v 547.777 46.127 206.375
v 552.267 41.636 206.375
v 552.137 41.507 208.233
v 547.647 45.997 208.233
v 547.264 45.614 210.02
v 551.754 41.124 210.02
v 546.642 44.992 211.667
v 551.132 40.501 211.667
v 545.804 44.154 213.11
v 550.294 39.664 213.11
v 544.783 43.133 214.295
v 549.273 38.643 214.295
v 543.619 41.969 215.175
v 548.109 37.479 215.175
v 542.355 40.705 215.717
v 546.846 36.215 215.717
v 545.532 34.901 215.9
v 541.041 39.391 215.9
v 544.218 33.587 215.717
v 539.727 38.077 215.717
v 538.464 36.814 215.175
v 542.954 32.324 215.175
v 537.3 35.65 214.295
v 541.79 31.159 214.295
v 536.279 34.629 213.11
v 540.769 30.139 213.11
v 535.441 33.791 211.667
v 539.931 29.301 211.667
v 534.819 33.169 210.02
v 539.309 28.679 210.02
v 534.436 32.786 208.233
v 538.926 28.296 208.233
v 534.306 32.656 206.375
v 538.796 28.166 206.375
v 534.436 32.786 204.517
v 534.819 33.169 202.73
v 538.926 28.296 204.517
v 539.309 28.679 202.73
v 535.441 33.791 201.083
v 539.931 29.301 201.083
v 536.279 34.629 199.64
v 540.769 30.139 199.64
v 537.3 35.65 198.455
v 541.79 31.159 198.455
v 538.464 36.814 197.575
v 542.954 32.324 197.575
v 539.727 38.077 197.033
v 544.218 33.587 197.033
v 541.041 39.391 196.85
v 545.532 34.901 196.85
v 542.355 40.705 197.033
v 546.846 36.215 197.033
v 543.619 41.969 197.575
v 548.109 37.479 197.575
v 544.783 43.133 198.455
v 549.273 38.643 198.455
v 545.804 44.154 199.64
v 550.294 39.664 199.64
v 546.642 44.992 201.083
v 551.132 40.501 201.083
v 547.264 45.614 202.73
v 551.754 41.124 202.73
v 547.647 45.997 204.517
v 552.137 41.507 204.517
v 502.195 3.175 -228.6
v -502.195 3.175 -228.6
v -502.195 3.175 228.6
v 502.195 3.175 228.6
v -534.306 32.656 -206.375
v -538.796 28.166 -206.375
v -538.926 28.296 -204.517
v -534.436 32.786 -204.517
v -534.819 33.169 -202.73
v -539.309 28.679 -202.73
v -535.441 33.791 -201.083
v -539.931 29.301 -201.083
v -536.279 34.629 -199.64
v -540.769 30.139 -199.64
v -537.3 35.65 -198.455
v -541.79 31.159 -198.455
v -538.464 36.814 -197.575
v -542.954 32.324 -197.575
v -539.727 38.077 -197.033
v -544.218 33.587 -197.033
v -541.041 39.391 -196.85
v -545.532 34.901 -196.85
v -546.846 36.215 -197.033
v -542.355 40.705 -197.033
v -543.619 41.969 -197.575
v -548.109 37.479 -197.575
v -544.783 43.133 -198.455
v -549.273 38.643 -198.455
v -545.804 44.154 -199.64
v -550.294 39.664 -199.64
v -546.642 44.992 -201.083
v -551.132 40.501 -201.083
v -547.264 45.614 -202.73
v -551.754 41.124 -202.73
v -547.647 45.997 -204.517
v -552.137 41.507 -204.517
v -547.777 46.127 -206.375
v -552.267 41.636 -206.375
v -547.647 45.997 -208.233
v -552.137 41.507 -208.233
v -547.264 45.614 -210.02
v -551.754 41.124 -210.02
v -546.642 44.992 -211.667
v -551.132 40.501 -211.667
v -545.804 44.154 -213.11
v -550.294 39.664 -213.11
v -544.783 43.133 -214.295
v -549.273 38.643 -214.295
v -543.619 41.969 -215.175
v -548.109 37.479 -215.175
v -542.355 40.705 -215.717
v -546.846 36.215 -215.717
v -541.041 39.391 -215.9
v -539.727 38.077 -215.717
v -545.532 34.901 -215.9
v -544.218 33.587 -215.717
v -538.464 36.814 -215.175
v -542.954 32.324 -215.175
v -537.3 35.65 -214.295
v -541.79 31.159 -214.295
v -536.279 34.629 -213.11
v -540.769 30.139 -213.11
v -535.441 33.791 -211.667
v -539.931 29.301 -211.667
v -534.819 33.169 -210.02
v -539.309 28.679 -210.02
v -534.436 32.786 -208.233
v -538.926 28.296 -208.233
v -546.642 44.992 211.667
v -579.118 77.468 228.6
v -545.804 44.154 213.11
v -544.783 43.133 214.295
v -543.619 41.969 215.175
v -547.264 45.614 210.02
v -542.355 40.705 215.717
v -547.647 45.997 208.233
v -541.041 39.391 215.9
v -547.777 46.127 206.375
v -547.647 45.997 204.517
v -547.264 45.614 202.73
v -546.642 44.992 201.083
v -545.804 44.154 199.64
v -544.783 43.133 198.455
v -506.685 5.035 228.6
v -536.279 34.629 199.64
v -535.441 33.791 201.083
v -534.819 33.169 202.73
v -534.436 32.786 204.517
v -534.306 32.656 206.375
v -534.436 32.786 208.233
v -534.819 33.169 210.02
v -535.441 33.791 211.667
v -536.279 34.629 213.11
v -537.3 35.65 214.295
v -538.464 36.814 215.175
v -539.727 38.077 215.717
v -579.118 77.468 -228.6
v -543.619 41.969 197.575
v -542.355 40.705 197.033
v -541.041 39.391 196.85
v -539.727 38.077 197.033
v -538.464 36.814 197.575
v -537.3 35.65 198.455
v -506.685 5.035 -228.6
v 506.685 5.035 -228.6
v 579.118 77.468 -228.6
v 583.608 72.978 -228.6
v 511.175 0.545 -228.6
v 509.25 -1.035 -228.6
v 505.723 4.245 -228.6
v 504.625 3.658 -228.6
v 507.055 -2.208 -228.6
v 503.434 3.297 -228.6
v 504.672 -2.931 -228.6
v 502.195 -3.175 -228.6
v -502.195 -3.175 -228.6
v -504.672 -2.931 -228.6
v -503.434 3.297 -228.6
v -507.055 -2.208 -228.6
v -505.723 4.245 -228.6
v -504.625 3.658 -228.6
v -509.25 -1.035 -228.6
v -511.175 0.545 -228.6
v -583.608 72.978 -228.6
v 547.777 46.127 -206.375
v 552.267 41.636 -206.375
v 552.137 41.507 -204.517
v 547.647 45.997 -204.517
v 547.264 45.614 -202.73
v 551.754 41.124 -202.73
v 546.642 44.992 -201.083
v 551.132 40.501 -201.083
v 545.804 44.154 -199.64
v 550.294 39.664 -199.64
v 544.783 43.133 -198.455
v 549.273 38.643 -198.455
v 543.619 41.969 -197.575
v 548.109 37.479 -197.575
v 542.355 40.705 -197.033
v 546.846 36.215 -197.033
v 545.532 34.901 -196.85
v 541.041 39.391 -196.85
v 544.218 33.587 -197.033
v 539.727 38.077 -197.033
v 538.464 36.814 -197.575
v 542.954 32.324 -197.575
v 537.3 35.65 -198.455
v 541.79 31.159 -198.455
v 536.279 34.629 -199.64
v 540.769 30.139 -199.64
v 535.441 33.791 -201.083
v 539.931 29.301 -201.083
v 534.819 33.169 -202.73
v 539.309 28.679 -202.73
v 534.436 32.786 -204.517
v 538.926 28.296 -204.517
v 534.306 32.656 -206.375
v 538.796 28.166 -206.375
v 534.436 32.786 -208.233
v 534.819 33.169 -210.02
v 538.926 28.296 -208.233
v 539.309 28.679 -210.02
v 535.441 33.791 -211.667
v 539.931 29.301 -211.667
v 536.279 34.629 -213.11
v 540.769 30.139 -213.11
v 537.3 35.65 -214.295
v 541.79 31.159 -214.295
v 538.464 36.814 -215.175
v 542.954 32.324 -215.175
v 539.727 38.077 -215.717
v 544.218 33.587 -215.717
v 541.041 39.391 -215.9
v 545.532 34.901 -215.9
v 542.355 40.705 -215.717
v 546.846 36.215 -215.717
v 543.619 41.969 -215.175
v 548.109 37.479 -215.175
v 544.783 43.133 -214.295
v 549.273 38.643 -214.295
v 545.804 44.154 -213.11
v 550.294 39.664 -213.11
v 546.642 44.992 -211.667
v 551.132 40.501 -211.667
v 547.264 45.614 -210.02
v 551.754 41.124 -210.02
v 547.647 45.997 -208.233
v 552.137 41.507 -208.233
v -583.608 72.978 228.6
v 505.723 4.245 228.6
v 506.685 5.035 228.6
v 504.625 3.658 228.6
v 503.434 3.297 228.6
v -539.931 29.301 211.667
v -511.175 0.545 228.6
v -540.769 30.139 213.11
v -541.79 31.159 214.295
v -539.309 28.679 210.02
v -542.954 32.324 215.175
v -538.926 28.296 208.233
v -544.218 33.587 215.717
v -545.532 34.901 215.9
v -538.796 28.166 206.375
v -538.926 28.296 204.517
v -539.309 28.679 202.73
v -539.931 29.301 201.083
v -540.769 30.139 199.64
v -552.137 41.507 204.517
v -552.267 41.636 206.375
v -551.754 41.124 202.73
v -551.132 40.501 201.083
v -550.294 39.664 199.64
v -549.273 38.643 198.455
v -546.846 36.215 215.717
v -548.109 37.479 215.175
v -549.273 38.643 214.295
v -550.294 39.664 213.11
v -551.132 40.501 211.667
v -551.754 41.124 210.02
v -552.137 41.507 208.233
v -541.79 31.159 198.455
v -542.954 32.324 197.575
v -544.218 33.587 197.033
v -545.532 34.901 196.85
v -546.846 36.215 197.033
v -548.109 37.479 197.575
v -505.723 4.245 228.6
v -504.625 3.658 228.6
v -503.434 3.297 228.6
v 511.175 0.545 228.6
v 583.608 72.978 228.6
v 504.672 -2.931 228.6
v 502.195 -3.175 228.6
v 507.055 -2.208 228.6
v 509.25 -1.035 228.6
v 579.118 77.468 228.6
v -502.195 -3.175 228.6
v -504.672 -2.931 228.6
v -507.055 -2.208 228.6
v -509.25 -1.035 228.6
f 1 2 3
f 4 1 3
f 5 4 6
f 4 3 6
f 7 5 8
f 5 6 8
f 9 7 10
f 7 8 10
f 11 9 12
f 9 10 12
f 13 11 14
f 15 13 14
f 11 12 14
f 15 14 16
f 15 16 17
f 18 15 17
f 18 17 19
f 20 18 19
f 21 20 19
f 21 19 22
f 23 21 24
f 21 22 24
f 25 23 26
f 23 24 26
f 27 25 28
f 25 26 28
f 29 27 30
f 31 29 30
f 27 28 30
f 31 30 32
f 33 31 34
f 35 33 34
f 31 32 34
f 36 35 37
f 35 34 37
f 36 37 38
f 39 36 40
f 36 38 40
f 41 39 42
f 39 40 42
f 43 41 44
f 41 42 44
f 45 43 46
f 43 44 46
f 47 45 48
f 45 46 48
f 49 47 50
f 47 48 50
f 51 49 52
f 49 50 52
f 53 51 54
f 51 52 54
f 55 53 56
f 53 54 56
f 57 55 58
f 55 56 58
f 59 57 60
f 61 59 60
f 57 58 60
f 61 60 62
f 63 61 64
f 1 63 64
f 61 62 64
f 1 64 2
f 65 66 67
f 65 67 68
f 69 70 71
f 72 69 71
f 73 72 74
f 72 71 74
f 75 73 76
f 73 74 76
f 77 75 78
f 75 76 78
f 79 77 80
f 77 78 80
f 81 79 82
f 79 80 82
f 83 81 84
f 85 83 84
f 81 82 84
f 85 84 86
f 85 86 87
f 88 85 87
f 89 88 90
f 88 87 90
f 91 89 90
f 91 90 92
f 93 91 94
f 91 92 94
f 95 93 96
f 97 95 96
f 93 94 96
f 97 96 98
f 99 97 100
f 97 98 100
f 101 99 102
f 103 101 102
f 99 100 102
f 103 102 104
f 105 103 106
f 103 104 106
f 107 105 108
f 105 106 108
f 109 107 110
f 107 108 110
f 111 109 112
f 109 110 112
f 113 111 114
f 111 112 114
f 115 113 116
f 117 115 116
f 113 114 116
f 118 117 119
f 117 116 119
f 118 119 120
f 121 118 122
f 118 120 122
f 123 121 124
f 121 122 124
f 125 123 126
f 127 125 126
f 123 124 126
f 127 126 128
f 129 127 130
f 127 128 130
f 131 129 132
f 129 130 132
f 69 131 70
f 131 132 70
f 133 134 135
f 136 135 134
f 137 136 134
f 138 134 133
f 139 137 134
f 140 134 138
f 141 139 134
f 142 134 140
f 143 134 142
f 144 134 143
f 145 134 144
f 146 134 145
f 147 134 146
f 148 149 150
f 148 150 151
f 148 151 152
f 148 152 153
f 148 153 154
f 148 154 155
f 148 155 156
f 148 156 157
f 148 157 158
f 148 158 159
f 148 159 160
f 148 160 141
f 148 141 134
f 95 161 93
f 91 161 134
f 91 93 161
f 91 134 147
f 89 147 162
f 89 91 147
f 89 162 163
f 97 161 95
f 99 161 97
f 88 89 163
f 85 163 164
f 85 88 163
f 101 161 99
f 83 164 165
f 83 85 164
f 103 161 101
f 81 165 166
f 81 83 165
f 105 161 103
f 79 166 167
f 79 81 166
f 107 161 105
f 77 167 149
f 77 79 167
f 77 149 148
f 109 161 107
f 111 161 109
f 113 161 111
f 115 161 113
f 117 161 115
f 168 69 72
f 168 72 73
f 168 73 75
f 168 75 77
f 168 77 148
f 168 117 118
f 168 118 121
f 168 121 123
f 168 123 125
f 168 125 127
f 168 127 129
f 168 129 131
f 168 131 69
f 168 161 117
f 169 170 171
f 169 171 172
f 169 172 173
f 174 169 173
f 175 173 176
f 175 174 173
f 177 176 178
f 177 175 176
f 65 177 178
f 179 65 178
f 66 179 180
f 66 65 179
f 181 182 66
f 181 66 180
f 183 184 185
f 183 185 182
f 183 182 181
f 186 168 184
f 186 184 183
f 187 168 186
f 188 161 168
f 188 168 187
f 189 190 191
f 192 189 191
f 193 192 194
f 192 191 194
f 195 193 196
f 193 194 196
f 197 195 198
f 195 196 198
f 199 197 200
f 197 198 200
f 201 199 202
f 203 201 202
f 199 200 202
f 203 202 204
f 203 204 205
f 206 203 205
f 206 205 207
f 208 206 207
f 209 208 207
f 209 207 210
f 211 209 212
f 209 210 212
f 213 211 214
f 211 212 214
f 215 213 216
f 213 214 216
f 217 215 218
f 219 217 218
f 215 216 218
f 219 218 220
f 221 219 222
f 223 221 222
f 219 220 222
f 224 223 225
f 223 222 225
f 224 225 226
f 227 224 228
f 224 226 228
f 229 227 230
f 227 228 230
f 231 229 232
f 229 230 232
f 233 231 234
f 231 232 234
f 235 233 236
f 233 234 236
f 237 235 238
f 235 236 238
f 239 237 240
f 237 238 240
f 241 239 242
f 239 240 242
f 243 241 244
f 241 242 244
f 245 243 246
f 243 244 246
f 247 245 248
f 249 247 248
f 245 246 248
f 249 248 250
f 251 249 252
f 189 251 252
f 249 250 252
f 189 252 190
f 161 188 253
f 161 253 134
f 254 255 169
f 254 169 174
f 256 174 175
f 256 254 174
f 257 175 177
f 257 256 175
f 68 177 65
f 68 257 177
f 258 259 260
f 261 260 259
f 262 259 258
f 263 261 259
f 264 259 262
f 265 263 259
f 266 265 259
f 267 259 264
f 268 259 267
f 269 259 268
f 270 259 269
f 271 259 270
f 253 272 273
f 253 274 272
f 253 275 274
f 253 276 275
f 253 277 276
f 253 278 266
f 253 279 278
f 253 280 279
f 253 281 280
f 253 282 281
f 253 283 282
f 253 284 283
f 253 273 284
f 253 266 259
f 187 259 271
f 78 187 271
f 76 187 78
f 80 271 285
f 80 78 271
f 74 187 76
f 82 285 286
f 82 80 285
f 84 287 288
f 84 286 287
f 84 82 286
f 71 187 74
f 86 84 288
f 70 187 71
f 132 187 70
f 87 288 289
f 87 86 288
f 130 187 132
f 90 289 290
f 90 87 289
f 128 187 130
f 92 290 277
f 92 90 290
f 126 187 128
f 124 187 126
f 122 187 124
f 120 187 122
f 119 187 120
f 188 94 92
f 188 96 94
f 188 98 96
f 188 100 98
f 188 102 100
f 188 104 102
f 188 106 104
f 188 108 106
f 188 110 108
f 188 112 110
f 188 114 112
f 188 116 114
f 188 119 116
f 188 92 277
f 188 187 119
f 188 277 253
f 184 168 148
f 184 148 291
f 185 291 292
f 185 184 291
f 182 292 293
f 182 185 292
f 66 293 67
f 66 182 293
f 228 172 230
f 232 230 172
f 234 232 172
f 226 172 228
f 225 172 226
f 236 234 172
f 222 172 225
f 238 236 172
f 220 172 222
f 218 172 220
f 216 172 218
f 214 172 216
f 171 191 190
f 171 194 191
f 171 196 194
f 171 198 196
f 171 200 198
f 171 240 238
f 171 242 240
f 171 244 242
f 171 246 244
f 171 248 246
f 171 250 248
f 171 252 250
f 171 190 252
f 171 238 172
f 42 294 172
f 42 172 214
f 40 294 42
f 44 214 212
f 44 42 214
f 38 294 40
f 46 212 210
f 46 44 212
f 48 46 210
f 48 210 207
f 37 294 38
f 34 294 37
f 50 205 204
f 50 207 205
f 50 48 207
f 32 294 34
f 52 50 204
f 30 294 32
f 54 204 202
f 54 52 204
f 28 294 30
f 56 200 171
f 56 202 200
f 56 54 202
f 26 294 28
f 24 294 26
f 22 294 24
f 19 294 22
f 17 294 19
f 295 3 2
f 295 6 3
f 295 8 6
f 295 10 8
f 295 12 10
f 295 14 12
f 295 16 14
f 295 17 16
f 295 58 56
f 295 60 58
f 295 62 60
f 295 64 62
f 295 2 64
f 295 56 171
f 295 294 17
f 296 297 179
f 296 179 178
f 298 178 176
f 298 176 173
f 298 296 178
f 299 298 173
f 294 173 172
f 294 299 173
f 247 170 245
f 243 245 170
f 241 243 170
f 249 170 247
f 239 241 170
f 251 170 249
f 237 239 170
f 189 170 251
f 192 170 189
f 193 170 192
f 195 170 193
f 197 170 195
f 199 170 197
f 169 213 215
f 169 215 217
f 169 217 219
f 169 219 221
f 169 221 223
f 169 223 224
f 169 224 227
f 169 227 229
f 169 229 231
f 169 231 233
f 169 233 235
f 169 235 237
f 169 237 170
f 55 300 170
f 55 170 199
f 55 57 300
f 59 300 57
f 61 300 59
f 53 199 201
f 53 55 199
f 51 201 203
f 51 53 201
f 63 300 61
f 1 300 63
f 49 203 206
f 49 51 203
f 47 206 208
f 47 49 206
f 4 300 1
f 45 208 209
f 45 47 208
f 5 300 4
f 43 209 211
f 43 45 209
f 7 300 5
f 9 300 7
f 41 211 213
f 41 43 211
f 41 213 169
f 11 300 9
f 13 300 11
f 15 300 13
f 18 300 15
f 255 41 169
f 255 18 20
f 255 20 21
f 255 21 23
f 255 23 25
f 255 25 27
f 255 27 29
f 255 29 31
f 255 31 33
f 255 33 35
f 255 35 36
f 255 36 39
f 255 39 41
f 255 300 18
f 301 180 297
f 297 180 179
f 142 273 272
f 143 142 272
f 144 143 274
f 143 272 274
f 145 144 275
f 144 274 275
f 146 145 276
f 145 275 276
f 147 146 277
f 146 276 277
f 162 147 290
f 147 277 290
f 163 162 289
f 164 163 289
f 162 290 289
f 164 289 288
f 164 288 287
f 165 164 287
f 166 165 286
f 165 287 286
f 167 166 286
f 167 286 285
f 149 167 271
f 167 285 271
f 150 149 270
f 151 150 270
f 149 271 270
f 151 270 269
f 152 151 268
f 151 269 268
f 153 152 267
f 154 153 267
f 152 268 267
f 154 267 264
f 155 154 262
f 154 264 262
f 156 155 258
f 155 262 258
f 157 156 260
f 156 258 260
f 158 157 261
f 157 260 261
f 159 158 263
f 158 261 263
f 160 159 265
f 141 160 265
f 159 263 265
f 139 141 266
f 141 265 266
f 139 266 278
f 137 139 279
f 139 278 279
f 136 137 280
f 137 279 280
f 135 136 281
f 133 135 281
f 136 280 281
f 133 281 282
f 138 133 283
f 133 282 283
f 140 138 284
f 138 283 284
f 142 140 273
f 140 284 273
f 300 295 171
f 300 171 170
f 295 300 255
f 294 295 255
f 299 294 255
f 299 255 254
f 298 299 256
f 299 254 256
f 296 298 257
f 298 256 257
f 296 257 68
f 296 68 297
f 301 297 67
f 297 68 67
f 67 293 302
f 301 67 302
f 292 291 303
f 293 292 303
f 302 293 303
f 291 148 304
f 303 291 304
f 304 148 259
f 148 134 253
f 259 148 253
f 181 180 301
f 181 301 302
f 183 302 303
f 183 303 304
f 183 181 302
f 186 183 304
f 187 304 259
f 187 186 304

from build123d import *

# Parameters (mm, degrees)
BASE_FLANGE1_START             = -3.175
BASE_FLANGE1_OUTLINE_W         = 1009.65
BASE_FLANGE1_OUTLINE_H         = 457.2
BASE_FLANGE1_DEPTH             = 6.35
EDGE_FLANGE1_STRIP_CUT_DEPTH   = 457.2
EDGE_FLANGE1_STRIP_CUT_2_DEPTH = 457.2
EDGE_FLANGE1_DEPTH             = 457.2
EDGE_FLANGE1_BEND_DEPTH        = 457.2
SKETCH12_R                     = 9.525
CUT_EXTRUDE1_DEPTH             = 6.35
SKETCH13_R                     = 9.525
CUT_EXTRUDE2_DEPTH             = 6.35


# Read off the part's stored shape, not the designer's step: Base-Flange1
# Sheet-metal steps are written as plain solids
with BuildPart() as part:
    # Base-Flange1 outline → Base-Flange1 (new body)
    with BuildSketch(Plane(origin=(0, 0, 0), x_dir=(1, 0, 0), z_dir=(0, 1, 0)).offset(BASE_FLANGE1_START)):
        Rectangle(BASE_FLANGE1_OUTLINE_W, BASE_FLANGE1_OUTLINE_H)
    extrude(amount=BASE_FLANGE1_DEPTH)

    # Edge-Flange1 strip (across the edge) → Edge-Flange1 strip cut (cut)
    with BuildSketch(Plane(origin=(504.825, 3.175, 228.6), x_dir=(-0.7071067811865438, 0.7071067811865512, 0), z_dir=(0, 0, -1))):
        Polygon((-29.571024484, 20.590768363), (-2.630256121, -6.35), (1.859871939, -1.859871939), (-25.080896424, 25.080896424), align=None)
    extrude(amount=EDGE_FLANGE1_STRIP_CUT_DEPTH, mode=Mode.SUBTRACT)

    # Edge-Flange1 strip 2 (across the edge) → Edge-Flange1 strip cut 2 (cut)
    with BuildSketch(Plane(origin=(-504.825, 3.175, -228.6), x_dir=(0.7071067811865438, 0.7071067811865512, 0), z_dir=(0, 0, 1))):
        Polygon((-29.571024484, 20.590768363), (-2.630256121, -6.35), (1.859871939, -1.859871939), (-25.080896424, 25.080896424), align=None)
    extrude(amount=EDGE_FLANGE1_STRIP_CUT_2_DEPTH, mode=Mode.SUBTRACT)

    # Edge-Flange1 section (across the edge) → Edge-Flange1 (add)
    with BuildSketch(Plane(origin=(504.825, 3.175, 228.6), x_dir=(-0.7071067811865438, 0.7071067811865512, 0), z_dir=(0, 0, -1))):
        with BuildLine():
            Line((-6.35, 2.630256121), (-6.35, 105.065743879))
            Line((-6.35, 105.065743879), (0, 105.065743879))
            Line((0, 105.065743879), (0, 2.630256121))
            ThreePointArc((0, 2.630256121), (0.483364969, 0.200216326), (1.859871939, -1.859871939))
            Line((1.859871939, -1.859871939), (-2.630256121, -6.35))
            ThreePointArc((-2.630256121, -6.35), (-5.383270063, -2.22982347), (-6.35, 2.630256121))
        make_face()
    extrude(amount=EDGE_FLANGE1_DEPTH)

    # Edge-Flange1 section 2 (across the edge) → Edge-Flange1 bend (add)
    with BuildSketch(Plane(origin=(-504.825, 3.175, -228.6), x_dir=(0.7071067811865438, 0.7071067811865512, 0), z_dir=(0, 0, 1))):
        with BuildLine():
            Line((-6.35, 2.630256121), (-6.35, 105.065743879))
            Line((-6.35, 105.065743879), (0, 105.065743879))
            Line((0, 105.065743879), (0, 2.630256121))
            ThreePointArc((0, 2.630256121), (0.483364969, 0.200216326), (1.859871939, -1.859871939))
            Line((1.859871939, -1.859871939), (-2.630256121, -6.35))
            ThreePointArc((-2.630256121, -6.35), (-5.383270063, -2.22982347), (-6.35, 2.630256121))
        make_face()
    extrude(amount=EDGE_FLANGE1_BEND_DEPTH)

    # Sketch12 → Cut-Extrude1 (cut)
    with BuildSketch(Plane(origin=(255.315128061, -255.315128061, 0), x_dir=(-0.7071067811865513, -0.7071067811865438, 0), z_dir=(0.7071067811865438, -0.7071067811865513, 0))):
        with Locations(Location((-410.427988722, -206.375, 0), (0, 0, 180))):
            Circle(SKETCH12_R)
        with Locations(Location((-410.427988722, 206.375, 0), (0, 0, 180))):
            Circle(SKETCH12_R)
    extrude(amount=-CUT_EXTRUDE1_DEPTH, mode=Mode.SUBTRACT)

    # Sketch13 → Cut-Extrude2 (cut)
    with BuildSketch(Plane(origin=(-255.315128061, -255.315128061, 0), x_dir=(0, 0, 1), z_dir=(-0.7071067811865442, -0.7071067811865509, 0))):
        with Locations(Location((-206.375, 410.427988722, 0), (0, 0, 270))):
            Circle(SKETCH13_R)
        with Locations(Location((206.375, 410.427988722, 0), (0, 0, 90))):
            Circle(SKETCH13_R)
    extrude(amount=-CUT_EXTRUDE2_DEPTH, mode=Mode.SUBTRACT)


solid = part.part
